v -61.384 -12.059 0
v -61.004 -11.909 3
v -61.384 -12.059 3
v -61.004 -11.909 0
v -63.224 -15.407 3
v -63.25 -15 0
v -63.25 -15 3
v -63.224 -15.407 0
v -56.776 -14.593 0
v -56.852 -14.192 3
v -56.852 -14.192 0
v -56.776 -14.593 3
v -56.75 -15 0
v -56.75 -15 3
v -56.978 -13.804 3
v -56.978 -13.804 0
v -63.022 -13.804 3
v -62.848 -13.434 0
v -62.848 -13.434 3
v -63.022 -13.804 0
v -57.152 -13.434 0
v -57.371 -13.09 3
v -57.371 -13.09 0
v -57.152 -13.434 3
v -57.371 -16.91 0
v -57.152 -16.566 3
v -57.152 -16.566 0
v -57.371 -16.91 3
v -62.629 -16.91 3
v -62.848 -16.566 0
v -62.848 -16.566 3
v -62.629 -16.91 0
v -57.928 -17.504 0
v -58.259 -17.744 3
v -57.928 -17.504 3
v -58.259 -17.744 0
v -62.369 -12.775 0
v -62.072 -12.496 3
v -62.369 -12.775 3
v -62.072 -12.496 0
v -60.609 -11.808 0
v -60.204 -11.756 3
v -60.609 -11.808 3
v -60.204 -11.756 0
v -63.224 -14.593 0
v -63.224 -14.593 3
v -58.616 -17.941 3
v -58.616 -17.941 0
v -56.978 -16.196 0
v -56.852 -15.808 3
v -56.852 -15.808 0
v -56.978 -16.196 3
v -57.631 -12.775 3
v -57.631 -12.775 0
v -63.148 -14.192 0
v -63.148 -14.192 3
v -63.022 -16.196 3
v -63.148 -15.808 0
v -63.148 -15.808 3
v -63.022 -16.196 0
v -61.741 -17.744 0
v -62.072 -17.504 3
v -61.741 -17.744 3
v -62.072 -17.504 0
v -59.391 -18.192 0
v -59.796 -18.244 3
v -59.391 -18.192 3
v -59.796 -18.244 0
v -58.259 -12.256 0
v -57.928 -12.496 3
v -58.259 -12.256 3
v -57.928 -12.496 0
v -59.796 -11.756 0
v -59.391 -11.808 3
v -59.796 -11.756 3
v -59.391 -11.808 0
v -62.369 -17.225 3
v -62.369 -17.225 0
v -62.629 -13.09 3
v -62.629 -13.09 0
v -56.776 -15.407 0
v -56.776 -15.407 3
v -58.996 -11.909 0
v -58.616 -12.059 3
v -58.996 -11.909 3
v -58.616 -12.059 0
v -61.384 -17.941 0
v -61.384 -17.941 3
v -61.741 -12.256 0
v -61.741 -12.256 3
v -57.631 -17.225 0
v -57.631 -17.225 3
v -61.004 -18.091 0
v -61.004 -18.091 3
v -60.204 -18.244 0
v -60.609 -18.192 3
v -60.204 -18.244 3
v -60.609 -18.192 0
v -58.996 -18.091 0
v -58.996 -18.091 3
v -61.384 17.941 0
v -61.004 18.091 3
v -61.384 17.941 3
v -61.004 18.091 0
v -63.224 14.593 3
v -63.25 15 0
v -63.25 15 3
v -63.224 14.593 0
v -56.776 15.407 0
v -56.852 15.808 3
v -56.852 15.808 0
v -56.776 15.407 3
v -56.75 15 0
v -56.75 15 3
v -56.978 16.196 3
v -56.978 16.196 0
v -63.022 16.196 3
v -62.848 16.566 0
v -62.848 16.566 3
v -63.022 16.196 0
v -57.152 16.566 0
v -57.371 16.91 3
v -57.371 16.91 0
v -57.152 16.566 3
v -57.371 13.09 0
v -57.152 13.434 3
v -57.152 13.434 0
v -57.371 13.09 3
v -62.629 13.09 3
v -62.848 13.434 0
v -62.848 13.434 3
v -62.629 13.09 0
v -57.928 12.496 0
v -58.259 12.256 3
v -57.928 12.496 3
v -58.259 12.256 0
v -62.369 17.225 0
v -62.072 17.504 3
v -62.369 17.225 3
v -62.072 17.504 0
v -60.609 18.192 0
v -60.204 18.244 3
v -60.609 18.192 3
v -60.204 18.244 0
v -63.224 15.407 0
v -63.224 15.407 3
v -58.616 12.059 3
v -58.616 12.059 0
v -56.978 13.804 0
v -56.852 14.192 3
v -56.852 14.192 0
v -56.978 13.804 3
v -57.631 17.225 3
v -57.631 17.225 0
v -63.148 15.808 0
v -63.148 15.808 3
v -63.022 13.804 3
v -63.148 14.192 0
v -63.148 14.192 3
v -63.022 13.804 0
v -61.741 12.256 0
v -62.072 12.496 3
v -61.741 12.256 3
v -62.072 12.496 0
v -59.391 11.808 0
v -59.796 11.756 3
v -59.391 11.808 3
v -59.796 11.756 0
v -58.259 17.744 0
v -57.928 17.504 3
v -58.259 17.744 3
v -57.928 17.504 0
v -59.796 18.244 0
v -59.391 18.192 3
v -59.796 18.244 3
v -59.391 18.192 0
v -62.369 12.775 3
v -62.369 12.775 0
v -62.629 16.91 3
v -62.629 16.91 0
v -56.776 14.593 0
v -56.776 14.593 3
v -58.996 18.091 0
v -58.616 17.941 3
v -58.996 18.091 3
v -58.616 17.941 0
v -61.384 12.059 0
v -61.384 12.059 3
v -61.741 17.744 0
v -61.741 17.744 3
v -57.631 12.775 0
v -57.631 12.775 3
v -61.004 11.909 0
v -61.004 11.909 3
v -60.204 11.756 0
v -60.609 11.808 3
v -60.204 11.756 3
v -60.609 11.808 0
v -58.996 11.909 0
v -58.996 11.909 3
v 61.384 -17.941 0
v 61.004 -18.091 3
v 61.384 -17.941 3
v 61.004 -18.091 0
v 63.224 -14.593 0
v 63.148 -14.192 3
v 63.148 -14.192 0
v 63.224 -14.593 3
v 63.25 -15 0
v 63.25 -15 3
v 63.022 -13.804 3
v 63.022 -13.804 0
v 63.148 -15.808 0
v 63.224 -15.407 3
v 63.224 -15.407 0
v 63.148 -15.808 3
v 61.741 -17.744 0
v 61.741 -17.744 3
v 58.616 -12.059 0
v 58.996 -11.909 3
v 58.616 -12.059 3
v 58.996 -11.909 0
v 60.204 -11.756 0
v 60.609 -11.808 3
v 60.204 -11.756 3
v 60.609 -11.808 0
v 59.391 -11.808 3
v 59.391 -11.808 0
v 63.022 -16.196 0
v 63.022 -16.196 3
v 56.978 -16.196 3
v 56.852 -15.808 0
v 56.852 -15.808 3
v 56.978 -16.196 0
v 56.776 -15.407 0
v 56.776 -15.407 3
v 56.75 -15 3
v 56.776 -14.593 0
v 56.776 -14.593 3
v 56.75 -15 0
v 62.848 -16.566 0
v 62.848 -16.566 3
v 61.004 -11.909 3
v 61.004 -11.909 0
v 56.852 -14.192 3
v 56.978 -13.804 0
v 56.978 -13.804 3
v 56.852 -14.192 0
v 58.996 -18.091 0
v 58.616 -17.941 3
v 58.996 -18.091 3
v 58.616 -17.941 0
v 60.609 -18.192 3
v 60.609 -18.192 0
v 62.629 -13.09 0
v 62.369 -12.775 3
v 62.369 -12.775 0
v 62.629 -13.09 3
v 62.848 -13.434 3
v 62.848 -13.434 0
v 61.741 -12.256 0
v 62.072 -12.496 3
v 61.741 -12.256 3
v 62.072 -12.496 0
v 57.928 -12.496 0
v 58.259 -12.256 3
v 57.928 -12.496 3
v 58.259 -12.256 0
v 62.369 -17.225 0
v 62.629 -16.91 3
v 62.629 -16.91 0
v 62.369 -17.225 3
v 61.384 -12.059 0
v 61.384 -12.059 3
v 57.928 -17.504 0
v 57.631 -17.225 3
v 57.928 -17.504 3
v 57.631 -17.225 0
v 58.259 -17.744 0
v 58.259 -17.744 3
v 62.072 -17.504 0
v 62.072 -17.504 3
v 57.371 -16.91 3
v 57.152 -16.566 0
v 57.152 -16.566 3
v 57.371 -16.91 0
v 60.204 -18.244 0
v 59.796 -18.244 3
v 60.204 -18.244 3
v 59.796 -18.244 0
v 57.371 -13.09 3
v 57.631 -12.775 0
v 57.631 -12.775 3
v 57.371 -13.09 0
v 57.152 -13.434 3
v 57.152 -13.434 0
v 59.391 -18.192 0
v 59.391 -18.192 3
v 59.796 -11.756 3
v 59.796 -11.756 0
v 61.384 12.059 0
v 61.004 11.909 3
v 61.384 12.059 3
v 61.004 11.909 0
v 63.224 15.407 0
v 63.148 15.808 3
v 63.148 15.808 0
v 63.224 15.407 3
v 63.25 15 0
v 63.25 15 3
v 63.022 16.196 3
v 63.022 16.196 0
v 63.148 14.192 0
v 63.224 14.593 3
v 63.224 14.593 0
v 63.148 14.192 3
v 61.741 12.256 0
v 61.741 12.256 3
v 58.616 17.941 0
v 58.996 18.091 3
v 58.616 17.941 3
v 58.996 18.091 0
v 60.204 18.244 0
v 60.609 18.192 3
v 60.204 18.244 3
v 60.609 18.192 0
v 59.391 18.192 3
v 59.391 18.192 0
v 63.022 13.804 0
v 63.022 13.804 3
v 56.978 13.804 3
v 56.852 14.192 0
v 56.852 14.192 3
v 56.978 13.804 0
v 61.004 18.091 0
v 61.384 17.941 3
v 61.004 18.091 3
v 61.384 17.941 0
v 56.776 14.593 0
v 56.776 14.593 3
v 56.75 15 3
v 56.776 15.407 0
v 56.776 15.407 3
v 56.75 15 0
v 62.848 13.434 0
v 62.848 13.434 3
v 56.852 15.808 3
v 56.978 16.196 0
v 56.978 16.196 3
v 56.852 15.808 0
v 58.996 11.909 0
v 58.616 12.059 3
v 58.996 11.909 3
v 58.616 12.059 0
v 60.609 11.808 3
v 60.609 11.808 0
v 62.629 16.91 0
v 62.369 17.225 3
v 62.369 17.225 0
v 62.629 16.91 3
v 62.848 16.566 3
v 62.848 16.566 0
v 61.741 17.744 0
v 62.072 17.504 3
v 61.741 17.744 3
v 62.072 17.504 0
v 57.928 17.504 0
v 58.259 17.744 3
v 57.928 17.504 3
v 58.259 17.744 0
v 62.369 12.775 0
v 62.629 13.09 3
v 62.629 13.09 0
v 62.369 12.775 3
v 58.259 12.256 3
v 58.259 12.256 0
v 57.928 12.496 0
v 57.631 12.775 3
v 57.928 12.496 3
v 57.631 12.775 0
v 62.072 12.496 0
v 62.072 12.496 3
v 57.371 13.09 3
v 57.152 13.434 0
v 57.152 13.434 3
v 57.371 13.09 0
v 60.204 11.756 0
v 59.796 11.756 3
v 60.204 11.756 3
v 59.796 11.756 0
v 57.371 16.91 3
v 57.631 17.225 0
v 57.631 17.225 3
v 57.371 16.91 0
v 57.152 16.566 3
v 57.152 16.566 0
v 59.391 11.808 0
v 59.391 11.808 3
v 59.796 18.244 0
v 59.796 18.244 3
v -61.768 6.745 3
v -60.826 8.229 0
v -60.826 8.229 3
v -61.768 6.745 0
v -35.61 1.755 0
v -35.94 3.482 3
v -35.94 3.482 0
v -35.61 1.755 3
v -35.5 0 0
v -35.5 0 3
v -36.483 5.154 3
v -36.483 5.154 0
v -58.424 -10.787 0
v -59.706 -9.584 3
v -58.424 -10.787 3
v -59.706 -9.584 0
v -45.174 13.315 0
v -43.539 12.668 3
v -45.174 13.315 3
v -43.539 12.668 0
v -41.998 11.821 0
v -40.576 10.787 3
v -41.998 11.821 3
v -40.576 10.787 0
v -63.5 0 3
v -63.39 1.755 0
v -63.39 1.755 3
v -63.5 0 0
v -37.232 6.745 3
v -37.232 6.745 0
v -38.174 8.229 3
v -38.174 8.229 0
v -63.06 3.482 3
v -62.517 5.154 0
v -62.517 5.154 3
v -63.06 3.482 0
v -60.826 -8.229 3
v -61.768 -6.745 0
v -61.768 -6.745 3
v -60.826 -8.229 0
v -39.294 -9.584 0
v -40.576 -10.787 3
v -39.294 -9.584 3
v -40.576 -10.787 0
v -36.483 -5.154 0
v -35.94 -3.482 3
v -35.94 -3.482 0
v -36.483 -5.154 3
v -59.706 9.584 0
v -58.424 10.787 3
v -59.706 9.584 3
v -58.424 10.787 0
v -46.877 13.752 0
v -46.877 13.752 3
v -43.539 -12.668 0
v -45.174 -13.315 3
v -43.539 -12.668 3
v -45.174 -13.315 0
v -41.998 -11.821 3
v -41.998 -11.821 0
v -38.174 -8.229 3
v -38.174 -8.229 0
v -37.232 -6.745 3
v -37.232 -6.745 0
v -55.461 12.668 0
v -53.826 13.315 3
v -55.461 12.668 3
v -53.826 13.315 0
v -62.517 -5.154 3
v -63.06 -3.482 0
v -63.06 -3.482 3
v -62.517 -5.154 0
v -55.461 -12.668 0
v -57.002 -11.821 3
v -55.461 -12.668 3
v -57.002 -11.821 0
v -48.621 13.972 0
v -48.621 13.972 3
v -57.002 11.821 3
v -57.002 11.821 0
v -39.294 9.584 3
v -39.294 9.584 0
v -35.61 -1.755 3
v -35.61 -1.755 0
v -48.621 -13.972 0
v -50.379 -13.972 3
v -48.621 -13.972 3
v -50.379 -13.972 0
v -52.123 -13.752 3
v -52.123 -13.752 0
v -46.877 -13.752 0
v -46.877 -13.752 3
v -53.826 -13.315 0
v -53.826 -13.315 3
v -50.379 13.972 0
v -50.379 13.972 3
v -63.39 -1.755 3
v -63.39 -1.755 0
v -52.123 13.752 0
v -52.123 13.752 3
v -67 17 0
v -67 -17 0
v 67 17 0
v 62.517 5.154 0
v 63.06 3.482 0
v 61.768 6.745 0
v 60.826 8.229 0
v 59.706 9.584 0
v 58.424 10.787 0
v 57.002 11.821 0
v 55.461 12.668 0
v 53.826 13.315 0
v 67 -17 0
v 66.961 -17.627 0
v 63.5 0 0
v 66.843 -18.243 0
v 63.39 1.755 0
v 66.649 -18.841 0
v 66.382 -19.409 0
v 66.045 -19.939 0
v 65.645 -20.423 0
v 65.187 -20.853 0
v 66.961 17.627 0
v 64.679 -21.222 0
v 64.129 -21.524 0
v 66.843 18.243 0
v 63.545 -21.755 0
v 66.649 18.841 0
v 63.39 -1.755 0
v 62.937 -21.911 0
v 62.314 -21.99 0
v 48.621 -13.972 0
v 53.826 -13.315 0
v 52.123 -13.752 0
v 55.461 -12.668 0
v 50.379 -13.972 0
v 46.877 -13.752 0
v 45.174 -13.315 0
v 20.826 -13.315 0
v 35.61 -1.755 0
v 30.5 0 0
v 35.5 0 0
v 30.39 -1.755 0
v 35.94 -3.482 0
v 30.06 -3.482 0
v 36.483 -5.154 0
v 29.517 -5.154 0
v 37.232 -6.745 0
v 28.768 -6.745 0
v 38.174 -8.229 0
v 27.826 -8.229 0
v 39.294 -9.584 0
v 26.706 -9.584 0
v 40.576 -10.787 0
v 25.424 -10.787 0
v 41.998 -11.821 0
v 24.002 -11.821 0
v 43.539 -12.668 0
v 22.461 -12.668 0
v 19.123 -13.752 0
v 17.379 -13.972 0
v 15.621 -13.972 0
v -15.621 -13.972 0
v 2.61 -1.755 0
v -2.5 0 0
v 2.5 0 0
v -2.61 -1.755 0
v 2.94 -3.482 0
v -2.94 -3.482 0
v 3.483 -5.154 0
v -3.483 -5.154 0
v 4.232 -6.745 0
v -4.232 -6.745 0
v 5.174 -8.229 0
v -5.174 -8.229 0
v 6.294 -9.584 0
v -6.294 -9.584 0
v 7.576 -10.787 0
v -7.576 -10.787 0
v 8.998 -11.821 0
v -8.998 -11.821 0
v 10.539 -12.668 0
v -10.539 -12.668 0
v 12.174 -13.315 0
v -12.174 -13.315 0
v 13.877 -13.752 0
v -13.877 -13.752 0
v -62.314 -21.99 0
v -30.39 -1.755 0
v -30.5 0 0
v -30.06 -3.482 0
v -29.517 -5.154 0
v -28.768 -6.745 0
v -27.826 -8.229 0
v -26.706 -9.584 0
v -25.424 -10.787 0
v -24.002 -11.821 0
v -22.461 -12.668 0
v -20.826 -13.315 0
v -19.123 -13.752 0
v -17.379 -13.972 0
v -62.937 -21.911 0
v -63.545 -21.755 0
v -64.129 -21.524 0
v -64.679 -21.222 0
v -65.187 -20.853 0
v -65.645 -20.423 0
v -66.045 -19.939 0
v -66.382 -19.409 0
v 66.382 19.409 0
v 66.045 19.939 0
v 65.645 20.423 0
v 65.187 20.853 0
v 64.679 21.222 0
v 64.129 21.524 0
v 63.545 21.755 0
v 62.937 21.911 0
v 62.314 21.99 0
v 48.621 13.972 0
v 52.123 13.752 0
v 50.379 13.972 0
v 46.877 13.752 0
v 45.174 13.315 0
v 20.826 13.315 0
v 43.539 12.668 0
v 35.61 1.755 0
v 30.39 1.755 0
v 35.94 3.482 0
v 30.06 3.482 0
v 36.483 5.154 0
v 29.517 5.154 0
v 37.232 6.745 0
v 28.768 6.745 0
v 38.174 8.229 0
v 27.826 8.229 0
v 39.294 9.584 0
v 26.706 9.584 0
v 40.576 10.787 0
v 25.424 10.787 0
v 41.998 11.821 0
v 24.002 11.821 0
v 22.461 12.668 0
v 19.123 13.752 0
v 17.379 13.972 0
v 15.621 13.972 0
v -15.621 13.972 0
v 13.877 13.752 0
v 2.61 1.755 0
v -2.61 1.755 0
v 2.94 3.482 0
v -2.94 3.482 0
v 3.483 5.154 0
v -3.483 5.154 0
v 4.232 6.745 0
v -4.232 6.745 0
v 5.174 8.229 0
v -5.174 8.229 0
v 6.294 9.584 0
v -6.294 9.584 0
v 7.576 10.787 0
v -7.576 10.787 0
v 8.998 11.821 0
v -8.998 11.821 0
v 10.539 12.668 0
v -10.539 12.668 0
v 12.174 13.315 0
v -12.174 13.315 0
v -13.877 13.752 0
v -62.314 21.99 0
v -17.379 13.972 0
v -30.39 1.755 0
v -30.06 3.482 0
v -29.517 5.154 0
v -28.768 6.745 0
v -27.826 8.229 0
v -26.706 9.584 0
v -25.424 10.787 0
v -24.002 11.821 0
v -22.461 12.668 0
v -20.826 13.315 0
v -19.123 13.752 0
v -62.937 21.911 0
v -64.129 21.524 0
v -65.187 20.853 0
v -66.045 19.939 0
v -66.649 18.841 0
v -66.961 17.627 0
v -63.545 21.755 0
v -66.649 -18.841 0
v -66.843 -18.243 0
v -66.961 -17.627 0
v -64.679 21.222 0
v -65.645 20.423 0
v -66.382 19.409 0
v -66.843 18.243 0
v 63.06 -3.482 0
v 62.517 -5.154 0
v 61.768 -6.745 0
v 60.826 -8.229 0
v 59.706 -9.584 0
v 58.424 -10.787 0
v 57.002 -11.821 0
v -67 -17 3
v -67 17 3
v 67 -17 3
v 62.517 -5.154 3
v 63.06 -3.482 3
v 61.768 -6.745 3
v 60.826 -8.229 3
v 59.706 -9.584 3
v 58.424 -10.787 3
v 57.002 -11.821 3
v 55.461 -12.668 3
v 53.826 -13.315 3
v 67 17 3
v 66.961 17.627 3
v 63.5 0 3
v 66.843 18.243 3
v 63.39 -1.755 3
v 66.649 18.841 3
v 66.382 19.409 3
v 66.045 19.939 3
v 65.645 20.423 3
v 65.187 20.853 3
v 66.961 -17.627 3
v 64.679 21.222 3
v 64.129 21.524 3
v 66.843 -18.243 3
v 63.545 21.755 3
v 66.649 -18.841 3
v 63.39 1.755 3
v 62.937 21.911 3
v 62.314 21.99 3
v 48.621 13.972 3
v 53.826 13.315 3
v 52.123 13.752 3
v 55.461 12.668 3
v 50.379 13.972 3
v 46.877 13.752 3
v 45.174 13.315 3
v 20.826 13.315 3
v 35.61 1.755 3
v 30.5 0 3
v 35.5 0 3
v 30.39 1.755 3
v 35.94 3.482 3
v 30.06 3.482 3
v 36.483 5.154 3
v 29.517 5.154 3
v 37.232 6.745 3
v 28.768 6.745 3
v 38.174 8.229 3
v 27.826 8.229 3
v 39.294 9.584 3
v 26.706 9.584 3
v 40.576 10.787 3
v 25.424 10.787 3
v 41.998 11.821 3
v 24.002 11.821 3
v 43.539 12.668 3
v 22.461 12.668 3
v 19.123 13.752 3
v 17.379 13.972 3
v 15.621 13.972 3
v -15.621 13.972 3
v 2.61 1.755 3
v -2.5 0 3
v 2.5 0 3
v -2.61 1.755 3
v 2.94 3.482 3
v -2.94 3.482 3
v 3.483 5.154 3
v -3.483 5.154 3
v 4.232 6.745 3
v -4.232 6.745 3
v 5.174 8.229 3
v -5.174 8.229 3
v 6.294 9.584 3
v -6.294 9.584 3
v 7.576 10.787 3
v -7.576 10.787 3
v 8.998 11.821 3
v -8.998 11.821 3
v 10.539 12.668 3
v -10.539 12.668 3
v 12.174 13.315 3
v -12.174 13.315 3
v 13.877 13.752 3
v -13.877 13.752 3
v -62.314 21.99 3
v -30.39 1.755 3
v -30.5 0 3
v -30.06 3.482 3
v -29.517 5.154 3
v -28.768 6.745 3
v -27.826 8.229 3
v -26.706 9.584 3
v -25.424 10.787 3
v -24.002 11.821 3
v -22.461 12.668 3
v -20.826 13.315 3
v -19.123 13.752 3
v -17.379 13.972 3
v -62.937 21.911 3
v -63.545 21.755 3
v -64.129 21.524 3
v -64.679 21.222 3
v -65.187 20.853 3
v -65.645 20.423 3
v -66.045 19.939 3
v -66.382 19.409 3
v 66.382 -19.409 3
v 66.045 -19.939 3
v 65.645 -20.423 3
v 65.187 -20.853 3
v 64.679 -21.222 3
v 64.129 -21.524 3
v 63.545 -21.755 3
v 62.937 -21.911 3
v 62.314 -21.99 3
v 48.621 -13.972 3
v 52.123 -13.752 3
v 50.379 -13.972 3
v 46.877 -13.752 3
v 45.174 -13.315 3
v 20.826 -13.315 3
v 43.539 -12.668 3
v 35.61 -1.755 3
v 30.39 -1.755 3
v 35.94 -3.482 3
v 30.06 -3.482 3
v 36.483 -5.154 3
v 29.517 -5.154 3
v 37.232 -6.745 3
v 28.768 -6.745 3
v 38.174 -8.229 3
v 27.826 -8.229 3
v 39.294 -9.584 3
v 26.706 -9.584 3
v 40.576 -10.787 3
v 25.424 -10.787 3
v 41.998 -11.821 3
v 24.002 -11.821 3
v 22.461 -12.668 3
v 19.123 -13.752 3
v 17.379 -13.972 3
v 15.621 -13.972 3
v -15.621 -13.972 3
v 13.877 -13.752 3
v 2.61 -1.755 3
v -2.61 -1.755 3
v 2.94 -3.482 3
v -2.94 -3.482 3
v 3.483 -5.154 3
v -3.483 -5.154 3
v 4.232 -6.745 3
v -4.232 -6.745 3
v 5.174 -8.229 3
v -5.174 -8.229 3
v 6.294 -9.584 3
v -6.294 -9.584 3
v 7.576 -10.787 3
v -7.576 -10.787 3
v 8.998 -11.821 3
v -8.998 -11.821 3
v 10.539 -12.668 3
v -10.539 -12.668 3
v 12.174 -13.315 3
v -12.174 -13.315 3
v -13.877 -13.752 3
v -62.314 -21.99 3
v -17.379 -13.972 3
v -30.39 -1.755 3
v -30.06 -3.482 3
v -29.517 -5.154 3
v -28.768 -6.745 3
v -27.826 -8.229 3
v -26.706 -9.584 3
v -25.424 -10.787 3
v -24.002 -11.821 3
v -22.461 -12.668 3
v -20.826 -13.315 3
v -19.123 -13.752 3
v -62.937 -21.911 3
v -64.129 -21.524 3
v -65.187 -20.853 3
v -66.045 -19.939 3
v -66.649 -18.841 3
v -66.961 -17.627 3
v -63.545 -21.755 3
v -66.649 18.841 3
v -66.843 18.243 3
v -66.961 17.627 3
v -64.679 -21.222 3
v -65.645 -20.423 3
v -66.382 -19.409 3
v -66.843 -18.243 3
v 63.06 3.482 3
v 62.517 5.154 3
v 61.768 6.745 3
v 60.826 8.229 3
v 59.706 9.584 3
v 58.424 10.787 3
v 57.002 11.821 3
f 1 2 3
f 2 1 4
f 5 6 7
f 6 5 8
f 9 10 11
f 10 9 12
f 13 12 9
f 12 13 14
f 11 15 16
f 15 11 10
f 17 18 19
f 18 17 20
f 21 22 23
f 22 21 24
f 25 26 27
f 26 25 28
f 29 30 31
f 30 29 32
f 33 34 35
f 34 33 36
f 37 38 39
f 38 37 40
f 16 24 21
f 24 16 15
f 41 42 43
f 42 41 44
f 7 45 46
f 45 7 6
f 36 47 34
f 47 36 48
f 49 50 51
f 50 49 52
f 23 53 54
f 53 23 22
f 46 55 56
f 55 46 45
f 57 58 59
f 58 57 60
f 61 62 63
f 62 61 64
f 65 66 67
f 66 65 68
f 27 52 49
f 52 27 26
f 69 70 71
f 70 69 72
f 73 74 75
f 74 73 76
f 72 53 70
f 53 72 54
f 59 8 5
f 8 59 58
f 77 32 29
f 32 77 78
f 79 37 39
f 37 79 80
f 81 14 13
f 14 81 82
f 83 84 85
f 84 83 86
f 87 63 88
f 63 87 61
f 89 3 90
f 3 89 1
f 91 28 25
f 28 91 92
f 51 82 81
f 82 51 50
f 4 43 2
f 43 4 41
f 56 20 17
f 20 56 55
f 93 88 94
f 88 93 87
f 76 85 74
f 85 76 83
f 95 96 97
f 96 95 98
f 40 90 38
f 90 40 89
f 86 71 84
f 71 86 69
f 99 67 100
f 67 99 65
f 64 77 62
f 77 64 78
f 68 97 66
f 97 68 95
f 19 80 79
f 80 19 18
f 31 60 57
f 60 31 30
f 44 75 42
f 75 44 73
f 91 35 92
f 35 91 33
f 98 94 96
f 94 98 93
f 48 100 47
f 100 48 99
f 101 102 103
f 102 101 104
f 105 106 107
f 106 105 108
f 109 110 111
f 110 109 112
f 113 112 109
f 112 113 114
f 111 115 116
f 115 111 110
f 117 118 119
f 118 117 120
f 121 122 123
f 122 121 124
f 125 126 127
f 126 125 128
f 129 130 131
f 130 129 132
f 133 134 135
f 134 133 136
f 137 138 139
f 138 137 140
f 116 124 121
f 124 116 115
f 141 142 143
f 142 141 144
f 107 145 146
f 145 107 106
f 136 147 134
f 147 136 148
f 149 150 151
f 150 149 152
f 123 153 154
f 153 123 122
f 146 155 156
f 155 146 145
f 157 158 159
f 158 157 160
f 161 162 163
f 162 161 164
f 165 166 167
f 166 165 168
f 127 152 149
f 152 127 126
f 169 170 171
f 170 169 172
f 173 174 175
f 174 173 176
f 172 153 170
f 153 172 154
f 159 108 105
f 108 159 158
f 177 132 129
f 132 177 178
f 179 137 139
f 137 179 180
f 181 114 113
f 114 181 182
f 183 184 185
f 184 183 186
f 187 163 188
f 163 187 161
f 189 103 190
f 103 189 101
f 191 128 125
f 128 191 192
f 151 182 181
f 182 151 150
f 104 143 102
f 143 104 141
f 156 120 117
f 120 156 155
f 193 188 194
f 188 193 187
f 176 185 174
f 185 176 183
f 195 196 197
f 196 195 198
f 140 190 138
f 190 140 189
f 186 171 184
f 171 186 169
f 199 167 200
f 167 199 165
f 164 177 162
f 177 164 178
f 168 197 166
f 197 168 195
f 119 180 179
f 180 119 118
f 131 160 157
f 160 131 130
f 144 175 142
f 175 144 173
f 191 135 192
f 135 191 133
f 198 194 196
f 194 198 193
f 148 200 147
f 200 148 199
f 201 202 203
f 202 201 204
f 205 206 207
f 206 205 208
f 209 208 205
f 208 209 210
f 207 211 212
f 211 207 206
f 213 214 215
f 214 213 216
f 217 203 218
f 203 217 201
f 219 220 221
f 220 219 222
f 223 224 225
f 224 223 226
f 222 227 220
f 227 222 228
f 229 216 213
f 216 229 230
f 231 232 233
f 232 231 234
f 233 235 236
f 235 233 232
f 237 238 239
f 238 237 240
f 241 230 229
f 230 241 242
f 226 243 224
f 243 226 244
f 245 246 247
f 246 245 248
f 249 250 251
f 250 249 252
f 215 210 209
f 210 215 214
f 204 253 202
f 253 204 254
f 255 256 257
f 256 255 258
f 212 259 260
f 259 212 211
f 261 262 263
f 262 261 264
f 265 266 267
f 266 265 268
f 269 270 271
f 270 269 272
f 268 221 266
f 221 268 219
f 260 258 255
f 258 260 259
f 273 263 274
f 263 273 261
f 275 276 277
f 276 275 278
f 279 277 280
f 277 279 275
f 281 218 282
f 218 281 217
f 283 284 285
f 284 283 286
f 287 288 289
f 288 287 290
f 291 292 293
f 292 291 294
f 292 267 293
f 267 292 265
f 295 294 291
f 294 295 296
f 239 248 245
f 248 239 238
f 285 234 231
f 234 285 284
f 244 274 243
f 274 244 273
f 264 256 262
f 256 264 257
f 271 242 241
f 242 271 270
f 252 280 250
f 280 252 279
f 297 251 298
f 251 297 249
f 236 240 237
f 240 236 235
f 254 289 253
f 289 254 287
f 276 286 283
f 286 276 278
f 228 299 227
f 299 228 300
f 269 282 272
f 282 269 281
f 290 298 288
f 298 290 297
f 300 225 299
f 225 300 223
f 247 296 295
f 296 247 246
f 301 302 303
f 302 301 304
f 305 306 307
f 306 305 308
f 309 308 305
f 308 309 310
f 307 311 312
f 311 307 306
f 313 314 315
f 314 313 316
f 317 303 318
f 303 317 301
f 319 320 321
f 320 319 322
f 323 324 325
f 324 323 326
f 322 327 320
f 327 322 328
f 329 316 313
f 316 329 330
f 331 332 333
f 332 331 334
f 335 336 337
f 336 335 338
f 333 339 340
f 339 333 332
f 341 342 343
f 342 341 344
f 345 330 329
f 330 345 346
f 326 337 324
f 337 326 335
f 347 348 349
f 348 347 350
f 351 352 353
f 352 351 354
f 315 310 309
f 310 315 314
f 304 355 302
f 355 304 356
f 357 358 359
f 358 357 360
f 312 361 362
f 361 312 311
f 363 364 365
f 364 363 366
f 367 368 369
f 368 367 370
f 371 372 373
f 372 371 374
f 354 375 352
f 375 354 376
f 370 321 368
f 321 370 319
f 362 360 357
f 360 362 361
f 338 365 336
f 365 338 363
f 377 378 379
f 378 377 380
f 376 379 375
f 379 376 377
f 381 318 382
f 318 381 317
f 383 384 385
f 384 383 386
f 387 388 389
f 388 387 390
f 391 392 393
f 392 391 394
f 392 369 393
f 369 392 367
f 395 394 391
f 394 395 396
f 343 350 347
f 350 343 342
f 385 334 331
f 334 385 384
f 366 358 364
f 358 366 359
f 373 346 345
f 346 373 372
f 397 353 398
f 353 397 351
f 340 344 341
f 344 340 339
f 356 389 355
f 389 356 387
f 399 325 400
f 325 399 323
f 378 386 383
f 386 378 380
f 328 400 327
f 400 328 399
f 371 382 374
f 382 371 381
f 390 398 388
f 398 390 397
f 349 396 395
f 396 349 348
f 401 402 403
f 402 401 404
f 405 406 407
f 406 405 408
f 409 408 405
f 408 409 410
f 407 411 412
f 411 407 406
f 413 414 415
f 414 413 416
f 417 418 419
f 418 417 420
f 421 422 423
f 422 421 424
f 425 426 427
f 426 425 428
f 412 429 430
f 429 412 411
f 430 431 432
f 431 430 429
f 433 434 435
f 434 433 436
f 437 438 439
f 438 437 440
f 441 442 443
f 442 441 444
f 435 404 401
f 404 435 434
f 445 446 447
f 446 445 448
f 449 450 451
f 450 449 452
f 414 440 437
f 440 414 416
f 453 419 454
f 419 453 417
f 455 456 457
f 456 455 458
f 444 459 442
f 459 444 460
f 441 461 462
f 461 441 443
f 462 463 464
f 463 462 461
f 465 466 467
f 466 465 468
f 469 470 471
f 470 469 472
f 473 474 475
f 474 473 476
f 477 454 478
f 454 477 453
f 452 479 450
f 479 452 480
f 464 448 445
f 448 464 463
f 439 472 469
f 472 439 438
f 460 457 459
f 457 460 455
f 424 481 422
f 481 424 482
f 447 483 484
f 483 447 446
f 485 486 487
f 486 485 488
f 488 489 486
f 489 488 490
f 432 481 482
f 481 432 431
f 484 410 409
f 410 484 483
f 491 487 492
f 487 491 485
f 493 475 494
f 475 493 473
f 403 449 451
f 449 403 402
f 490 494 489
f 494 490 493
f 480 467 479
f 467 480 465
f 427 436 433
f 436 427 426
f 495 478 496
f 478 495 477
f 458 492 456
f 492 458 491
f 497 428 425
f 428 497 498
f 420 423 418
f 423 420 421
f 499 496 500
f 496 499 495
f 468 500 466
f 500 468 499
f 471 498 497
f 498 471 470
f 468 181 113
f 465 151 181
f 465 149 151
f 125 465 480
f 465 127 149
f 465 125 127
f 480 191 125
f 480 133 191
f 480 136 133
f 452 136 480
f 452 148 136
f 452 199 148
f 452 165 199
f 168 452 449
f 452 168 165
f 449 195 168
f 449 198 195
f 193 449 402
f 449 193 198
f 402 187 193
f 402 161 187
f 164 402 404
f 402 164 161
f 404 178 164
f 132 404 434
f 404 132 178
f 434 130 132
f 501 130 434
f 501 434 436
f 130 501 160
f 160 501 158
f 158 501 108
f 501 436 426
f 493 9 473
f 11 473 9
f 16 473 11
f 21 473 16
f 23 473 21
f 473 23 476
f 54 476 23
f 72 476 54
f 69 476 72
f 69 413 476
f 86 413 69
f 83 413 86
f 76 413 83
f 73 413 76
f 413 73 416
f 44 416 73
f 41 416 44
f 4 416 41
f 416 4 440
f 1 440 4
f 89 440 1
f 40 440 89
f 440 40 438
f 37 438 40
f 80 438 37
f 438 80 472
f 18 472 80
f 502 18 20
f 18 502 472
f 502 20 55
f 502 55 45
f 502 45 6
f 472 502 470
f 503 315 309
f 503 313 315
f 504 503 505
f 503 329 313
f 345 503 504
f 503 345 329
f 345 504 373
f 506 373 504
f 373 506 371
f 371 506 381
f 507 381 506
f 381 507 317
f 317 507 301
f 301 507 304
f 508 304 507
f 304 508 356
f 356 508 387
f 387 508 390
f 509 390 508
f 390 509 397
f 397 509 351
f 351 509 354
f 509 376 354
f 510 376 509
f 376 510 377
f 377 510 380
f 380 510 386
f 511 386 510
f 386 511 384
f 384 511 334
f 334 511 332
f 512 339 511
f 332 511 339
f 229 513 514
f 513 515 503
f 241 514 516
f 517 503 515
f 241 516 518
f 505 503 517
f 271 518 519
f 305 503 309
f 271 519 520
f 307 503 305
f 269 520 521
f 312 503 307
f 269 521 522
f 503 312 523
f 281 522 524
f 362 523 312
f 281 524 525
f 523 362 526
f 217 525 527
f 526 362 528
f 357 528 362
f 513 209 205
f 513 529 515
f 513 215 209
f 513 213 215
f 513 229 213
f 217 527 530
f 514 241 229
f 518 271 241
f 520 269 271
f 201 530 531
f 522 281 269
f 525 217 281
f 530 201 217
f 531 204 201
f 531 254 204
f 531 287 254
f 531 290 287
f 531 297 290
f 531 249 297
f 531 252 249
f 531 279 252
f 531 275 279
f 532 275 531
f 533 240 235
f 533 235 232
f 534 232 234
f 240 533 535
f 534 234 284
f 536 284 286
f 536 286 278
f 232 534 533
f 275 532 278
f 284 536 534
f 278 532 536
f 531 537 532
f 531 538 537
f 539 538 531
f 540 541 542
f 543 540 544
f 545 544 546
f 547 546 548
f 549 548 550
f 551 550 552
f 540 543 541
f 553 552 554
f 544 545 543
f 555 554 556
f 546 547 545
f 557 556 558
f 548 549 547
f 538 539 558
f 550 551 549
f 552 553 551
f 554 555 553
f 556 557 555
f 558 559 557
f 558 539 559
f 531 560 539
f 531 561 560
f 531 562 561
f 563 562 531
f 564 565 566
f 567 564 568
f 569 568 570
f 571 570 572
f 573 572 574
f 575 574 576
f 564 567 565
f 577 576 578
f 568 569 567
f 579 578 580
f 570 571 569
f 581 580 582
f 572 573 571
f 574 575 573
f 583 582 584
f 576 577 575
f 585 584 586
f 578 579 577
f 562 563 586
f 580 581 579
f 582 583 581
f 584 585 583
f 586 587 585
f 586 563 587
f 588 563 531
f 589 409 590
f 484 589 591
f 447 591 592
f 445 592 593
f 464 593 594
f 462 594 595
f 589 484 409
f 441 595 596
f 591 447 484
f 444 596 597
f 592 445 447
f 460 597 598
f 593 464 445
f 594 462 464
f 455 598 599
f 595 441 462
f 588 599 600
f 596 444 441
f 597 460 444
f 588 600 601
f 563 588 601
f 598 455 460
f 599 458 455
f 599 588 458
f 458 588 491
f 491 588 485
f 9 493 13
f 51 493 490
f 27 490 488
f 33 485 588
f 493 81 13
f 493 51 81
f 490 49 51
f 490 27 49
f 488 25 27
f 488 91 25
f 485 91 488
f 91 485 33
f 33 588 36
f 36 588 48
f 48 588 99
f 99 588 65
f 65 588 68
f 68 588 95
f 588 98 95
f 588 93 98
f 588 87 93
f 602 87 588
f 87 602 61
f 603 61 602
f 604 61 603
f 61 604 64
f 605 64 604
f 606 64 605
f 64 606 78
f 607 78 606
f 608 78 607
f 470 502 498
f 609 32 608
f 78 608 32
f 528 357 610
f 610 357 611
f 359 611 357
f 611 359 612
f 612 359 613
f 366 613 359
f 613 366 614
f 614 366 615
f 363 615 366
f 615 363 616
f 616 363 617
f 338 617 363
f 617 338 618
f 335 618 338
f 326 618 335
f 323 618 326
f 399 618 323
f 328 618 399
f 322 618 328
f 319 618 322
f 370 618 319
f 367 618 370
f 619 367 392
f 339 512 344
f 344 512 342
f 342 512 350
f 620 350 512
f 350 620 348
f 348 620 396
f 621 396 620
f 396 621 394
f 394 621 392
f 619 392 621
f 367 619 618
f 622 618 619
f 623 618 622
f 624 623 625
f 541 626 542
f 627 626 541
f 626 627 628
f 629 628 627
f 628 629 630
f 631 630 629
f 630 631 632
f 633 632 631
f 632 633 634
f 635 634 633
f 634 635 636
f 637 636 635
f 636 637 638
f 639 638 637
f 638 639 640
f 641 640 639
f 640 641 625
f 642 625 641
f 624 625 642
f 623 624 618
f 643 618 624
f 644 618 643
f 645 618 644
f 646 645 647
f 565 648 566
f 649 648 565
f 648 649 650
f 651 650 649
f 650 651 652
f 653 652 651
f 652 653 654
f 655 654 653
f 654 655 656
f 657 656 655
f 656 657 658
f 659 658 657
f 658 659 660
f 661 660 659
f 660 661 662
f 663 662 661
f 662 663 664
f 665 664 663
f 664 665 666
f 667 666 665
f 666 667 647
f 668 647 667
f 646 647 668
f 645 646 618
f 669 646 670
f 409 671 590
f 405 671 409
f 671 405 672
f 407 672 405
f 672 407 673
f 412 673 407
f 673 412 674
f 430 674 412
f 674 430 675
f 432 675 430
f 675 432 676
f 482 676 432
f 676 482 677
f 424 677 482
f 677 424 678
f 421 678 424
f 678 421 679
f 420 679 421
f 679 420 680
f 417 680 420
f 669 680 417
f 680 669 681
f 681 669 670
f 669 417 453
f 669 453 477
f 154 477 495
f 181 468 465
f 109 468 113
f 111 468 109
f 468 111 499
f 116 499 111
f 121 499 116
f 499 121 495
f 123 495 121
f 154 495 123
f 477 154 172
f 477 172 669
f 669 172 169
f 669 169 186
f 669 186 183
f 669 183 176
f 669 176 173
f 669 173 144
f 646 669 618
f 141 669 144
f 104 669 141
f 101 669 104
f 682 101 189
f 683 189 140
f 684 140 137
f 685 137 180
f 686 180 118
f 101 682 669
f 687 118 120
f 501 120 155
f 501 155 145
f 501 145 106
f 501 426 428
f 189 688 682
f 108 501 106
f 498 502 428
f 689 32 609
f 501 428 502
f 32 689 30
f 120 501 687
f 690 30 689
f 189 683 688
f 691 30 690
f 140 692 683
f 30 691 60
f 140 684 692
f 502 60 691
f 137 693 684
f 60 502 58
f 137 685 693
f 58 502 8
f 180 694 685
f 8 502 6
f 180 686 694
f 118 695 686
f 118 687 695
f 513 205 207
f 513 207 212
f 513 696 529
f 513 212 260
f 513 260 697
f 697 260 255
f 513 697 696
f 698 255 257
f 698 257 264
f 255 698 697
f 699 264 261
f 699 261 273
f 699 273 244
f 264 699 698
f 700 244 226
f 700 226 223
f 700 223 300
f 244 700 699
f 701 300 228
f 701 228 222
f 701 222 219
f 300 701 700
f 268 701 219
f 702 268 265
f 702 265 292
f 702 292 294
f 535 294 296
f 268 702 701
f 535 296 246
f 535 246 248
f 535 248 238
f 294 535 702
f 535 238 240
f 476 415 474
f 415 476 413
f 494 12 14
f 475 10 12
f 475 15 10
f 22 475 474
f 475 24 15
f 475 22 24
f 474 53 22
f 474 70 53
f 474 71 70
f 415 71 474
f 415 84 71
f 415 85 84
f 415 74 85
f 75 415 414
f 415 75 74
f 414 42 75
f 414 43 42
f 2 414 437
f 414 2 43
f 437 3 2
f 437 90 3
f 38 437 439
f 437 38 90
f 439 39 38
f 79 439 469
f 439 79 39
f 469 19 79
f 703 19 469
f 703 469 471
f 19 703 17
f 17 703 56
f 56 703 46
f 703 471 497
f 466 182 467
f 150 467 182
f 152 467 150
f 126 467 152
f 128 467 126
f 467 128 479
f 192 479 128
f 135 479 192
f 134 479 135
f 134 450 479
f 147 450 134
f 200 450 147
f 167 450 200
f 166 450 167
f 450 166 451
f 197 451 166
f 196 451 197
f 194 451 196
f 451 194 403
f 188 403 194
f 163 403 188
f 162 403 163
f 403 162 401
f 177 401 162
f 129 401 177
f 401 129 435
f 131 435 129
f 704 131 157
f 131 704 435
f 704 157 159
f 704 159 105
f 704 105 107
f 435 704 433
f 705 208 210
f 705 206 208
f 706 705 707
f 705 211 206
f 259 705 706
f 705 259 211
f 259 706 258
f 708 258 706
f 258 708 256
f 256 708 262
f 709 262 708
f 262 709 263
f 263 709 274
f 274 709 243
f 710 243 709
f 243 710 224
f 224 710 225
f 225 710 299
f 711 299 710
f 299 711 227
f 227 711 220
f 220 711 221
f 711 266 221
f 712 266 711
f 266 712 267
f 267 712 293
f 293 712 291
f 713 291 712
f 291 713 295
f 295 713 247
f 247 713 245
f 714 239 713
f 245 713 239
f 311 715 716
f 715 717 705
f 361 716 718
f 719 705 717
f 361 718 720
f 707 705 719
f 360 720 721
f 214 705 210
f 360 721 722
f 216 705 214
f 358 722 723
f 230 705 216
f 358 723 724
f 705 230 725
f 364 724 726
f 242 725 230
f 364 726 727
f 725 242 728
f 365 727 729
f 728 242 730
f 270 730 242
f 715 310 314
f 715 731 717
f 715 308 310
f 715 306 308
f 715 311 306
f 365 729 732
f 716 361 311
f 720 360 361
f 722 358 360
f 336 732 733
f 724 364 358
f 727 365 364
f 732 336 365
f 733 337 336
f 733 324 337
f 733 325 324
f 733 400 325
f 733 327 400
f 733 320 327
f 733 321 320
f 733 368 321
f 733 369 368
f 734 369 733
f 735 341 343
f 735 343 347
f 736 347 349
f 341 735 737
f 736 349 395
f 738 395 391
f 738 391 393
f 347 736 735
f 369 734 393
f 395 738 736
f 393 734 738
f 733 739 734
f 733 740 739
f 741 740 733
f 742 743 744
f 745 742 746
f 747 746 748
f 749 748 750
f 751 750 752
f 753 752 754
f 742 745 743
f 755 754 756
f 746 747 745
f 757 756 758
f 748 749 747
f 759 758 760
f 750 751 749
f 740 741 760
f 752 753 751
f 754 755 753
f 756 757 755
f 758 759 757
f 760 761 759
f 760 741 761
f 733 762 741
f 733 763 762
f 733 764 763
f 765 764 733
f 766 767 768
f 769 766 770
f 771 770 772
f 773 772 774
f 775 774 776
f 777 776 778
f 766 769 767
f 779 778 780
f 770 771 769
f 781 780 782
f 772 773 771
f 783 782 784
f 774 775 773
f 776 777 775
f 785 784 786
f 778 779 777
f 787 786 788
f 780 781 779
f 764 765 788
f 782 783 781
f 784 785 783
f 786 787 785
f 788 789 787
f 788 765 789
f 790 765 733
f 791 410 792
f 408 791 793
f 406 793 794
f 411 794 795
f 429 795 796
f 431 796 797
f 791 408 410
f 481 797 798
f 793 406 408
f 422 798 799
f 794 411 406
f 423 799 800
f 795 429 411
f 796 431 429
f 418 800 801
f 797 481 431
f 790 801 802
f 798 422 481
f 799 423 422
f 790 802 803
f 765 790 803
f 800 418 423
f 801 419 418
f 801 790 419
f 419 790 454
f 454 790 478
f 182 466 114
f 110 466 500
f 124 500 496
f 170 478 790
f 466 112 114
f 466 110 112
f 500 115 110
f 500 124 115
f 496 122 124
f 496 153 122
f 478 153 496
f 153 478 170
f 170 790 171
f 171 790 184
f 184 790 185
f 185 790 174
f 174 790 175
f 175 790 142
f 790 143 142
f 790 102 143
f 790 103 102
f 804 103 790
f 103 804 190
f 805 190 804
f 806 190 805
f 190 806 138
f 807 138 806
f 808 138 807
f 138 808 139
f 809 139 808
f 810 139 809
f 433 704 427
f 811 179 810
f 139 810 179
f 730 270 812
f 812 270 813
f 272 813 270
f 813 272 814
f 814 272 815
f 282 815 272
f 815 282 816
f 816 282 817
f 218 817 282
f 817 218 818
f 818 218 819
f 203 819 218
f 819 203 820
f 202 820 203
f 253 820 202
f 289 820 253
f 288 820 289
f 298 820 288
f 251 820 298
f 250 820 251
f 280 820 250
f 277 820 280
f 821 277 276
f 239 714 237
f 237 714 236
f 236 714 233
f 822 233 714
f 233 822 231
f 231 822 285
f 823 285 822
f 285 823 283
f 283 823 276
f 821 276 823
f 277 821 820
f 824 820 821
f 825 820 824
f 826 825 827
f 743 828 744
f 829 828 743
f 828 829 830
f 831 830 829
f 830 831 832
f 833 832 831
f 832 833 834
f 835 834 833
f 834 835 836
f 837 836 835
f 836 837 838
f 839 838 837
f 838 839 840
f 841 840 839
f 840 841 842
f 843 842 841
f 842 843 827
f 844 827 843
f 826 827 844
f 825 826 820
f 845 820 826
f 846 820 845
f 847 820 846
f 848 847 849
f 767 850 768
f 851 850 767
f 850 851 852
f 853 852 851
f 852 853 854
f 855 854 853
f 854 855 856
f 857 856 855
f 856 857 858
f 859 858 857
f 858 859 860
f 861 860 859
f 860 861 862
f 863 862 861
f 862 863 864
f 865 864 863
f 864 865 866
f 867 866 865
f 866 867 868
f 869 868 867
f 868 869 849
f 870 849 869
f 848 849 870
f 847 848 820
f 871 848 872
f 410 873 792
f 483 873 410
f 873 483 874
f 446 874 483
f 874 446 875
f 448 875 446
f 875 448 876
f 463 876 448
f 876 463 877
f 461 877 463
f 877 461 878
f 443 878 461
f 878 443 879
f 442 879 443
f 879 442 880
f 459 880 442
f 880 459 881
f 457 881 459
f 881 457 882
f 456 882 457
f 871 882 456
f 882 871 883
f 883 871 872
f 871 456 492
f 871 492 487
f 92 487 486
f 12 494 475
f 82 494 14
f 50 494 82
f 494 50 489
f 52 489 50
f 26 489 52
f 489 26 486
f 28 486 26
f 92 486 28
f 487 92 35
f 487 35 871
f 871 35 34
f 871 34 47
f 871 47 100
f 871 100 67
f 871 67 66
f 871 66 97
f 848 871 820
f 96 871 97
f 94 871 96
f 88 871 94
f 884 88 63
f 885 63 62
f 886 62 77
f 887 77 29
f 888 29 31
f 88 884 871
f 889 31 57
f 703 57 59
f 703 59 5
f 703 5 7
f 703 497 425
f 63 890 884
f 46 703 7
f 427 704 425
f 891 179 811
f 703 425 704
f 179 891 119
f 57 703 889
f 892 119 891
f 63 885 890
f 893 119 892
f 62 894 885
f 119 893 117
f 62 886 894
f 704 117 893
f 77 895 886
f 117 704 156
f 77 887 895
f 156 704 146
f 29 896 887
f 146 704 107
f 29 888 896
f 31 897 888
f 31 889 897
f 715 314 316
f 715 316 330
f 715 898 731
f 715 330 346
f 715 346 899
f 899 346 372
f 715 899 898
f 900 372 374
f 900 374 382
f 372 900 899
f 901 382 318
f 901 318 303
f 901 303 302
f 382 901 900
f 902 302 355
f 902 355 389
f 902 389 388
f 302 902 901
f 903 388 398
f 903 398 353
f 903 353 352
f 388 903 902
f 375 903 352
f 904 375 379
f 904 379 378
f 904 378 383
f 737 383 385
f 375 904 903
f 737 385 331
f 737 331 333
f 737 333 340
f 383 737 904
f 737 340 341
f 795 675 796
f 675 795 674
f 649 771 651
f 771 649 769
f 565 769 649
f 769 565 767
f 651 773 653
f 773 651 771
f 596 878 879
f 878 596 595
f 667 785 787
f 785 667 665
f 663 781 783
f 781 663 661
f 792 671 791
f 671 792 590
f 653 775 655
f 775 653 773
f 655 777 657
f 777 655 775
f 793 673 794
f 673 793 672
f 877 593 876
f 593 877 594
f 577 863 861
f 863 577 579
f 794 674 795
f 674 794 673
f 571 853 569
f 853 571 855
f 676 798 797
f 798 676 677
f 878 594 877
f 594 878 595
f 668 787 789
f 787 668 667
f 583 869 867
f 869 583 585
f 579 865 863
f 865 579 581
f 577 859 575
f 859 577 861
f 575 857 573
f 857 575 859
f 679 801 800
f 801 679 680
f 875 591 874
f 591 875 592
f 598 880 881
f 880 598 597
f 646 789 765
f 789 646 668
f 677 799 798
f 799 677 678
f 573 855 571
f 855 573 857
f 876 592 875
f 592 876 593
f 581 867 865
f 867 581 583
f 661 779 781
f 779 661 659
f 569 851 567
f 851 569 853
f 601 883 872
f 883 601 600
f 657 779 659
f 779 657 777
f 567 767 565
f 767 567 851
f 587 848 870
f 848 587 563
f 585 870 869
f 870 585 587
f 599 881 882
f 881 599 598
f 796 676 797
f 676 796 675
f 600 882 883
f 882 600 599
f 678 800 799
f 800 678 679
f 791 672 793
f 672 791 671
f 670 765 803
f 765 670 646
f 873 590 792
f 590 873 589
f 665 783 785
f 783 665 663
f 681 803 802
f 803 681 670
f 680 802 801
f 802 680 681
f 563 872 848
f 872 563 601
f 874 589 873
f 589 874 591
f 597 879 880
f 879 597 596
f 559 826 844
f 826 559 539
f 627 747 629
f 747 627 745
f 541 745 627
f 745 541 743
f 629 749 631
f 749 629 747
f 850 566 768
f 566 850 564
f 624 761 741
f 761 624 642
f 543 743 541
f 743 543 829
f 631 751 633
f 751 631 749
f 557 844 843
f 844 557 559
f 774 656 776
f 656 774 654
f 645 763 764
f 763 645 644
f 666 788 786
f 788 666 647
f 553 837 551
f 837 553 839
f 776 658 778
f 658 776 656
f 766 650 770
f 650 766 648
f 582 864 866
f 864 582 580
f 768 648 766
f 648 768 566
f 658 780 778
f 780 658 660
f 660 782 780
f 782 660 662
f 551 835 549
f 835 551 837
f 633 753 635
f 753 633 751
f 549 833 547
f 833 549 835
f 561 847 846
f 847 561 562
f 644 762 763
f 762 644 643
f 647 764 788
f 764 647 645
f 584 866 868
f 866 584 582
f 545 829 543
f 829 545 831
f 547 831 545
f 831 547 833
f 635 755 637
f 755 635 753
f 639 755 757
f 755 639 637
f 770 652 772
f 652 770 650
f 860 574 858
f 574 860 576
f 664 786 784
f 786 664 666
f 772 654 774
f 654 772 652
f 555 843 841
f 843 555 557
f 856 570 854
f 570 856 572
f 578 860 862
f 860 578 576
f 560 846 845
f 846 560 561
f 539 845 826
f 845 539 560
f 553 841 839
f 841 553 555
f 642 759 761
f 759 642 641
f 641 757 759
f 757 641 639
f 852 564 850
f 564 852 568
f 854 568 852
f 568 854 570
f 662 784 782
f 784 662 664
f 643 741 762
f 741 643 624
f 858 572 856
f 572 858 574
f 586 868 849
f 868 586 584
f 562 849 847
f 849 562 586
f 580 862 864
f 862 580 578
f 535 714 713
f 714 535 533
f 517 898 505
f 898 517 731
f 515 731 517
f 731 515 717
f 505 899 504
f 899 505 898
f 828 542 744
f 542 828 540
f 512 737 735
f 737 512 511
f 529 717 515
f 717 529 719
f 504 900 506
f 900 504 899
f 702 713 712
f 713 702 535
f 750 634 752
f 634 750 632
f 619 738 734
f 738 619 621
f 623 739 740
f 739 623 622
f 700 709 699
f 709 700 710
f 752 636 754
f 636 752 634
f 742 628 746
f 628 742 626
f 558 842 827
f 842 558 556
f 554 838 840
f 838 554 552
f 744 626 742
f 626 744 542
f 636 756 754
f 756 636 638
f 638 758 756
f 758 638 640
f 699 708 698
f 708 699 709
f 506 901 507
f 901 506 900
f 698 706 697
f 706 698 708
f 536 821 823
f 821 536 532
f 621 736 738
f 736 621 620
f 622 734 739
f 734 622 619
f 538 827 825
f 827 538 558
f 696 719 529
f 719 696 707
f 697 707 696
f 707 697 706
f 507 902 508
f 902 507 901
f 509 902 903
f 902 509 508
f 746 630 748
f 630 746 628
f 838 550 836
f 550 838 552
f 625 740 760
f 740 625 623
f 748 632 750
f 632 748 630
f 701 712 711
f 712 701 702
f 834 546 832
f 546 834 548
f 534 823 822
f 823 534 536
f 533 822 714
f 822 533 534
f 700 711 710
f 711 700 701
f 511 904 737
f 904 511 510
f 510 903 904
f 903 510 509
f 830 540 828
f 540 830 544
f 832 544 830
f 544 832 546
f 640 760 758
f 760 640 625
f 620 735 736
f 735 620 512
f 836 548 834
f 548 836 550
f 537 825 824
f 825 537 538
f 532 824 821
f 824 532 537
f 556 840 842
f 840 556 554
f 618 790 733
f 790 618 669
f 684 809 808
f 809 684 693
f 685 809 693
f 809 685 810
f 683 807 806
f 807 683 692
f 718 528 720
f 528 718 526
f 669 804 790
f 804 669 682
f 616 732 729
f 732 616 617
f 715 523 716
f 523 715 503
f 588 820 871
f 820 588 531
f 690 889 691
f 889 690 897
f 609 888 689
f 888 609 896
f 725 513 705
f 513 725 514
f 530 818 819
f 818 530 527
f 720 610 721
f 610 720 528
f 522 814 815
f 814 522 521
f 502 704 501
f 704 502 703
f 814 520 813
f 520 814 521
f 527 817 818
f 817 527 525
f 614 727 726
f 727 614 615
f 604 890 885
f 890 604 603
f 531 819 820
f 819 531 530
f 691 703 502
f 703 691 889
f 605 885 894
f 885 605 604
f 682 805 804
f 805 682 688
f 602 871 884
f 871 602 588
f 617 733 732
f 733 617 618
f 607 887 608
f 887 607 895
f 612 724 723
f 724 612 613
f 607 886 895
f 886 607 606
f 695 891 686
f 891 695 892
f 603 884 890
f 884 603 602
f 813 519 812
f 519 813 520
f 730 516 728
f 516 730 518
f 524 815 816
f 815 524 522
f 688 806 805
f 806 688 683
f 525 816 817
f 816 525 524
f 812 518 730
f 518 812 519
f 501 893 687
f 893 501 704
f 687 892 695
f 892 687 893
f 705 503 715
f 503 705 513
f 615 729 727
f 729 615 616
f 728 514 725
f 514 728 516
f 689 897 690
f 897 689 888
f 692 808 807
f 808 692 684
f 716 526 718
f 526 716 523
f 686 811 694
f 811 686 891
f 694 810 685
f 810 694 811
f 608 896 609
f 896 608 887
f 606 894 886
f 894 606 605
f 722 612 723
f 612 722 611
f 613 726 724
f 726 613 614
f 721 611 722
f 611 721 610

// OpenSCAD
$fn = 50;

difference() {
	union() {
		hull() {
			translate(v = [-62.0, 17.0, 0]) {
				cylinder(h = 3, r = 5);
			}
			translate(v = [62.0, 17.0, 0]) {
				cylinder(h = 3, r = 5);
			}
			translate(v = [-62.0, -17.0, 0]) {
				cylinder(h = 3, r = 5);
			}
			translate(v = [62.0, -17.0, 0]) {
				cylinder(h = 3, r = 5);
			}
		}
	}
	union() {
		translate(v = [-60.0, -15.0, -100.0]) {
			cylinder(h = 200, r = 3.25);
		}
		translate(v = [-60.0, 15.0, -100.0]) {
			cylinder(h = 200, r = 3.25);
		}
		translate(v = [60.0, -15.0, -100.0]) {
			cylinder(h = 200, r = 3.25);
		}
		translate(v = [60.0, 15.0, -100.0]) {
			cylinder(h = 200, r = 3.25);
		}
		translate(v = [-60.0, -15.0, -100.0]) {
			cylinder(h = 200, r = 1.8);
		}
		translate(v = [-60.0, 15.0, -100.0]) {
			cylinder(h = 200, r = 1.8);
		}
		translate(v = [60.0, -15.0, -100.0]) {
			cylinder(h = 200, r = 1.8);
		}
		translate(v = [60.0, 15.0, -100.0]) {
			cylinder(h = 200, r = 1.8);
		}
		translate(v = [-49.5, 0, 0.0]) {
			cylinder(h = 3, r = 14.0);
		}
		translate(v = [-16.5, 0, 0.0]) {
			cylinder(h = 3, r = 14.0);
		}
		translate(v = [16.5, 0, 0.0]) {
			cylinder(h = 3, r = 14.0);
		}
		translate(v = [49.5, 0, 0.0]) {
			cylinder(h = 3, r = 14.0);
		}
	}
}
